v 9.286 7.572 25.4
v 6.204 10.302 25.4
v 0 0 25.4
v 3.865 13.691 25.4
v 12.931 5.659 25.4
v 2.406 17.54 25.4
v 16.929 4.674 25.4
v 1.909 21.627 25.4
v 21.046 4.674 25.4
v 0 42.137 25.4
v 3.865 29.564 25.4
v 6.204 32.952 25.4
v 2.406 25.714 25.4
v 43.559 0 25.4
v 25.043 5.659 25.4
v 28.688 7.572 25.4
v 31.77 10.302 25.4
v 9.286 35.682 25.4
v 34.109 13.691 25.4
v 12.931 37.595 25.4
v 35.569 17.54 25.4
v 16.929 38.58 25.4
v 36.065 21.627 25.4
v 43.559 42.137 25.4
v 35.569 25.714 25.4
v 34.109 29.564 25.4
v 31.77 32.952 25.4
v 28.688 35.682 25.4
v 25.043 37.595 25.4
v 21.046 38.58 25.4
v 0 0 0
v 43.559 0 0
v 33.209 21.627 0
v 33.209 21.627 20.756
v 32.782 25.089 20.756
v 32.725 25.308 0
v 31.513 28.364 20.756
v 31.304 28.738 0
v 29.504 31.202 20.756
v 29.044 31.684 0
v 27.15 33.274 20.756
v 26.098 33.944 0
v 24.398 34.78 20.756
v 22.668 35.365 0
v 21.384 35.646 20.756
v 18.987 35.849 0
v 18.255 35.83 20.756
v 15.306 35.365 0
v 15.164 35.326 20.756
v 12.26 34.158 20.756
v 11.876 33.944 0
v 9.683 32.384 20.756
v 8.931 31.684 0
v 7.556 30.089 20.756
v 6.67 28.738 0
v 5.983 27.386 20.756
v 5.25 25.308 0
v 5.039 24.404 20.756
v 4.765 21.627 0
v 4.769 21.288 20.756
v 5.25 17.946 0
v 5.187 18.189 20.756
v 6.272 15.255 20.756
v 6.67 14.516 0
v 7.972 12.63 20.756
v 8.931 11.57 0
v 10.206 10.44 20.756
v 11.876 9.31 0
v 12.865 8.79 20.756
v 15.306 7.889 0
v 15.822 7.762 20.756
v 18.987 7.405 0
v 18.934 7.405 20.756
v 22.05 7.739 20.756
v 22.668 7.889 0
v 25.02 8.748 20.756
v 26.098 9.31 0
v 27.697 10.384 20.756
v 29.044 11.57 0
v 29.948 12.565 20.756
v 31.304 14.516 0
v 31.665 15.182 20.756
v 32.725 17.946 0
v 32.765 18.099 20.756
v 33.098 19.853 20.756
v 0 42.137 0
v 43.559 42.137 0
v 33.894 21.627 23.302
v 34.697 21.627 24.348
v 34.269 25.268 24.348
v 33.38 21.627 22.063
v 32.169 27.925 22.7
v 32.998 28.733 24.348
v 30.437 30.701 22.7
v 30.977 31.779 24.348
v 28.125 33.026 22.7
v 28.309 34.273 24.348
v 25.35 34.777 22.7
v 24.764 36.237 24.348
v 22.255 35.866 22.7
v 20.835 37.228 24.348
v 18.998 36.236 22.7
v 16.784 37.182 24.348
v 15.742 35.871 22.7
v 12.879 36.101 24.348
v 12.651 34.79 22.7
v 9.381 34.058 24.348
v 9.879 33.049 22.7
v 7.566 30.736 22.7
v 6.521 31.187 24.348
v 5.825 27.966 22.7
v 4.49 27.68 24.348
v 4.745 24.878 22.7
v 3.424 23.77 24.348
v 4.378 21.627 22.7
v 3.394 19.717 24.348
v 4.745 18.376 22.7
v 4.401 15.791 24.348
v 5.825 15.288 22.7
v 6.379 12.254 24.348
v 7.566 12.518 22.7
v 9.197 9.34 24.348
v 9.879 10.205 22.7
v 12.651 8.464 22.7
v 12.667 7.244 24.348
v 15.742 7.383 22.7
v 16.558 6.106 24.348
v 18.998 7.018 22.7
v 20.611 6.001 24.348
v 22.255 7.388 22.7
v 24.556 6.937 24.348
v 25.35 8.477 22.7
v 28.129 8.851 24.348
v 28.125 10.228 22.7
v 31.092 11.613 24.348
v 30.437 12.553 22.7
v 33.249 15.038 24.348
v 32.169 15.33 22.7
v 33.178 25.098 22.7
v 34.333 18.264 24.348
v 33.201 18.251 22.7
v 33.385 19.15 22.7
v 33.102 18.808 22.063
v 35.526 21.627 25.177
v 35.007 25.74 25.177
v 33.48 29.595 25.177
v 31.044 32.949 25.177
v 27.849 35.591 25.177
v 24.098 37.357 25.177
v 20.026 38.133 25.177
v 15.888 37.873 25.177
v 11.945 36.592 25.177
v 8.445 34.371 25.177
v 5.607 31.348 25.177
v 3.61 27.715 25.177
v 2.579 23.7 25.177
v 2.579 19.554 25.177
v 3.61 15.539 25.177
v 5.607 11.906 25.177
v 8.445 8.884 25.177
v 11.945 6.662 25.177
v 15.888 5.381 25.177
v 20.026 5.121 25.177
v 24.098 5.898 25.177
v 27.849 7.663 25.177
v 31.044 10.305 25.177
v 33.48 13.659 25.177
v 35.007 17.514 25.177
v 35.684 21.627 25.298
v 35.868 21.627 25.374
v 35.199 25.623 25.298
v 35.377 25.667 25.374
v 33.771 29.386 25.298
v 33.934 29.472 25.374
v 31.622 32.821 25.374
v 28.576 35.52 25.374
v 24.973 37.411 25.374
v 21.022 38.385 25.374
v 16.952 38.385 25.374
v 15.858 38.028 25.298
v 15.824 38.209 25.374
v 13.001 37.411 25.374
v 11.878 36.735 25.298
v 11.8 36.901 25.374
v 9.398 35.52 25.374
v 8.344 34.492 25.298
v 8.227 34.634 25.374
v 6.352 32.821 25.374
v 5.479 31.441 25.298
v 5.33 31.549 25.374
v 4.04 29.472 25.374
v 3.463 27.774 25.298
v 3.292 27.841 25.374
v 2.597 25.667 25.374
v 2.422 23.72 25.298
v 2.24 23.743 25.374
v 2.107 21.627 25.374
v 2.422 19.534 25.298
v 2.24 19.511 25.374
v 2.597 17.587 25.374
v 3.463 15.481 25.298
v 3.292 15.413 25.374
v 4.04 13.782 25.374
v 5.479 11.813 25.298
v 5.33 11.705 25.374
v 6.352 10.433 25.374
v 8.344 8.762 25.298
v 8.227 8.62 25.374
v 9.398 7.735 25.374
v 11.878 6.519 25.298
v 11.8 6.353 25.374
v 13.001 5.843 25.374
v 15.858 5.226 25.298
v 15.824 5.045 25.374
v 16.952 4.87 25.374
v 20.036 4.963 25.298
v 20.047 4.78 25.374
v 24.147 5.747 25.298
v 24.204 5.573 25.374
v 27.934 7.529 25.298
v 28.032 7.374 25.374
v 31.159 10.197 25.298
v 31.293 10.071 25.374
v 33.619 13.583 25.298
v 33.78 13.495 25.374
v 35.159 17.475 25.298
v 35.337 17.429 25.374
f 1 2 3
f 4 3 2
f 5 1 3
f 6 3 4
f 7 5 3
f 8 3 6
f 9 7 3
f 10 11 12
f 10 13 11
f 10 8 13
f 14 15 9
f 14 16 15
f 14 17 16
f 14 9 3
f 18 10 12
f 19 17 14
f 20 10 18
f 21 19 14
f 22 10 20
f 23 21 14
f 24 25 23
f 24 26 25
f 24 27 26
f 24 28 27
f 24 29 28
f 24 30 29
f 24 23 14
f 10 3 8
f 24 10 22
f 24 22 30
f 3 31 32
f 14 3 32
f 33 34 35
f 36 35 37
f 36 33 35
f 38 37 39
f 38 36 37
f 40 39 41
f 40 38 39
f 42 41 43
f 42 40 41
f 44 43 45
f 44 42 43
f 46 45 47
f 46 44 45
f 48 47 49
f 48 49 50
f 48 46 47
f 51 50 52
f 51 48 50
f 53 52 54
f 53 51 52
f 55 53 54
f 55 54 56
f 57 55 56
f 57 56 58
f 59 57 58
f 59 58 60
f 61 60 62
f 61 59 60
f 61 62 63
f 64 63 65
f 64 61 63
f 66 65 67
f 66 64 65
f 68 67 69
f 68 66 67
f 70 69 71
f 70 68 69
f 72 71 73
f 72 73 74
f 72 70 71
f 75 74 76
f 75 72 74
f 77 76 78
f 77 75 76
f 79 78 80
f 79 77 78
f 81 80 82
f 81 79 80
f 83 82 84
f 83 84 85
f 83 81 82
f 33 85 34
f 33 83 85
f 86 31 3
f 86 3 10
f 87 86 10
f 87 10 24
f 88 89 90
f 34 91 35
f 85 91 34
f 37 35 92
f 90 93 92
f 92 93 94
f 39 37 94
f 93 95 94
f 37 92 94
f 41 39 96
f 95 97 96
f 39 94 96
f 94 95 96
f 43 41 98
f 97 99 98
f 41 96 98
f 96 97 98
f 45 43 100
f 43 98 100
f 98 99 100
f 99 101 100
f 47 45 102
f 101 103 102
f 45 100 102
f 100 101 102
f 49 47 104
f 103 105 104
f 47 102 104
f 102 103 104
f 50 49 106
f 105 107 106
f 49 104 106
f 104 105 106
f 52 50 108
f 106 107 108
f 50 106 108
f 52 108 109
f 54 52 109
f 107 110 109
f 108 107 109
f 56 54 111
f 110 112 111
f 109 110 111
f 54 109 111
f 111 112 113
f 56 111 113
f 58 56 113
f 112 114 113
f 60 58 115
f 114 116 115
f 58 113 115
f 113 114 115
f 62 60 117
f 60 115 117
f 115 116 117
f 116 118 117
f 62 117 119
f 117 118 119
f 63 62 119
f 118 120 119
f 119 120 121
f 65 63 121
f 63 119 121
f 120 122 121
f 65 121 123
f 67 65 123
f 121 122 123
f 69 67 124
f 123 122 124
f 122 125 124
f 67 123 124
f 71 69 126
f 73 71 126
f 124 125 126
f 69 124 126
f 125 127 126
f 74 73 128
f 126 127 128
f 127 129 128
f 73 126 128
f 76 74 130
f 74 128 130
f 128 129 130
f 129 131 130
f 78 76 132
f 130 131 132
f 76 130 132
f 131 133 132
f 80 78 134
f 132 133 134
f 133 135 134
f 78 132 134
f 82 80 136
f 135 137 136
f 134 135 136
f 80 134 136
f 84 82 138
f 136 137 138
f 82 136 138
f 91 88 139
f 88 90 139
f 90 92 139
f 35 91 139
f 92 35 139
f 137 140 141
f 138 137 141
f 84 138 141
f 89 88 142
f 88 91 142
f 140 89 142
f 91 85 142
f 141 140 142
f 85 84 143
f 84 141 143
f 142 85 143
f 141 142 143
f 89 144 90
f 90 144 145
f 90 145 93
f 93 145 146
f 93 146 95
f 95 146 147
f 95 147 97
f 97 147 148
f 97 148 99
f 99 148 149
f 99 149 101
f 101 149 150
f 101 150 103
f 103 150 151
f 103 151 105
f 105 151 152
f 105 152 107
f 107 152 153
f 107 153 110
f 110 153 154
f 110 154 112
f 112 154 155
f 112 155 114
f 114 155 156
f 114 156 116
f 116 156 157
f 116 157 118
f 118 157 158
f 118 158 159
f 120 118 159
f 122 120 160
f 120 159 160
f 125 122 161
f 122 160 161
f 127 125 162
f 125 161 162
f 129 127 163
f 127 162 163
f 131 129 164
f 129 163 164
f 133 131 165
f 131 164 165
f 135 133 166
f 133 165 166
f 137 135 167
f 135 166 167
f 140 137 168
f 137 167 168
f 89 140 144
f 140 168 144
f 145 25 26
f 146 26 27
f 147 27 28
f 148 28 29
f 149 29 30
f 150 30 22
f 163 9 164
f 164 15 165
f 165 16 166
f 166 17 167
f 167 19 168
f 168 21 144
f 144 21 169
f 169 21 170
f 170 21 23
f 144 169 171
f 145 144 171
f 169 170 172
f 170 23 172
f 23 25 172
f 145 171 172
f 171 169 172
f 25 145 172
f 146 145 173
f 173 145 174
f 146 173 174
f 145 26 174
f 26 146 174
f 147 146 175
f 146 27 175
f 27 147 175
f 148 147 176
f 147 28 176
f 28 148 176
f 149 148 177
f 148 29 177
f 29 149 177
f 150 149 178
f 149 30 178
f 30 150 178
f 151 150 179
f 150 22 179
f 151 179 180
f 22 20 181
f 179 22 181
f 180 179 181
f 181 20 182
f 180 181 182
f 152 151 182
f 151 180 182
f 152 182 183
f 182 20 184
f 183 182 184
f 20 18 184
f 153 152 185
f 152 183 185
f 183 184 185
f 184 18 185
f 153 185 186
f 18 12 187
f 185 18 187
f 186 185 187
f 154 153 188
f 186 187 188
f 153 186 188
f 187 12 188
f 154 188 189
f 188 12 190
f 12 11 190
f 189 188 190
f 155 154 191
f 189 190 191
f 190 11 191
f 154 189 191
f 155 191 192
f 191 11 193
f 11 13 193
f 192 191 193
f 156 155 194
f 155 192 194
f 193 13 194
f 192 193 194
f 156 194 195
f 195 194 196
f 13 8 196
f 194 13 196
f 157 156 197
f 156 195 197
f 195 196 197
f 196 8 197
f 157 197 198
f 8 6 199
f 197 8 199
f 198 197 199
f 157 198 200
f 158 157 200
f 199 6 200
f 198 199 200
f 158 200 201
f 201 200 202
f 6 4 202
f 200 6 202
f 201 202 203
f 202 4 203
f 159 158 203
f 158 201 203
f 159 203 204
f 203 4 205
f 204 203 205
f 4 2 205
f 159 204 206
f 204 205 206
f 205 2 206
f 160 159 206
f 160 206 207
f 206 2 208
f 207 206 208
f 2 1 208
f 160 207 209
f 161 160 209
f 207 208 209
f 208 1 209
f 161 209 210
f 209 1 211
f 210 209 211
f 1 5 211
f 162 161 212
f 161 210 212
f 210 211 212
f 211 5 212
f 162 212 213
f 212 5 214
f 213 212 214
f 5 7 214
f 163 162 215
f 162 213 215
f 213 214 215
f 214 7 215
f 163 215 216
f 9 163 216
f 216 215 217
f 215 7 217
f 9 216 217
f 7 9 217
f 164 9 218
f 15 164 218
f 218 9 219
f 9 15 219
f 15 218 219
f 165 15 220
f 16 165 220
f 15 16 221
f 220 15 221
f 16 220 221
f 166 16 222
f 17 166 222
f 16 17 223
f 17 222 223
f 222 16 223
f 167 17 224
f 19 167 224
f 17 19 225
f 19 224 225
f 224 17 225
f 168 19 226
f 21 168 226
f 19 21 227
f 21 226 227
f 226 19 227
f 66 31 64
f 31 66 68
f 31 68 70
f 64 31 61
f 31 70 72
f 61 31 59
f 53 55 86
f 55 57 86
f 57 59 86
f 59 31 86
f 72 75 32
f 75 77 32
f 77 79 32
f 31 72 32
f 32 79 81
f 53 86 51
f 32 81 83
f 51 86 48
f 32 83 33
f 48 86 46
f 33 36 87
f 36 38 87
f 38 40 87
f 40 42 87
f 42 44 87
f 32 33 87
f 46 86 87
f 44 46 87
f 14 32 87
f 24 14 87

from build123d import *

# Parameters (mm, degrees)
F0_W     = 43.5587465763
F0_H     = 42.1372503042
F0_R     = 14.2222248189
F1_DEPTH = 25.4
F2_SIZE  = 2.54
F3_R     = 0.762
F4_R     = 5.08


with BuildPart() as f1:
    # F0 (on Top) → F1 (new body)
    with BuildSketch(Plane.XY):
        with Locations((21.7793732882, 21.0686251521)):
            Rectangle(F0_W, F0_H)
        with Locations((18.9871452749, 21.6270685196)):
            Circle(F0_R, mode=Mode.SUBTRACT)
    extrude(amount=F1_DEPTH)

    # F2
    f2_edges = [f1.edges().sort_by_distance(p)[0] for p in [
        (4.76492, 21.627069, 25.4),
    ]]
    chamfer(f2_edges, length=F2_SIZE)

    # F3
    f3_edges = [f1.edges().sort_by_distance(p)[0] for p in [
        (2.22492, 21.627069, 25.4),
    ]]
    fillet(f3_edges, radius=F3_R)

    # F4
    f4_edges = [f1.edges().sort_by_distance(p)[0] for p in [
        (4.76492, 21.627069, 22.86),
    ]]
    fillet(f4_edges, radius=F4_R)


solid = f1.part
